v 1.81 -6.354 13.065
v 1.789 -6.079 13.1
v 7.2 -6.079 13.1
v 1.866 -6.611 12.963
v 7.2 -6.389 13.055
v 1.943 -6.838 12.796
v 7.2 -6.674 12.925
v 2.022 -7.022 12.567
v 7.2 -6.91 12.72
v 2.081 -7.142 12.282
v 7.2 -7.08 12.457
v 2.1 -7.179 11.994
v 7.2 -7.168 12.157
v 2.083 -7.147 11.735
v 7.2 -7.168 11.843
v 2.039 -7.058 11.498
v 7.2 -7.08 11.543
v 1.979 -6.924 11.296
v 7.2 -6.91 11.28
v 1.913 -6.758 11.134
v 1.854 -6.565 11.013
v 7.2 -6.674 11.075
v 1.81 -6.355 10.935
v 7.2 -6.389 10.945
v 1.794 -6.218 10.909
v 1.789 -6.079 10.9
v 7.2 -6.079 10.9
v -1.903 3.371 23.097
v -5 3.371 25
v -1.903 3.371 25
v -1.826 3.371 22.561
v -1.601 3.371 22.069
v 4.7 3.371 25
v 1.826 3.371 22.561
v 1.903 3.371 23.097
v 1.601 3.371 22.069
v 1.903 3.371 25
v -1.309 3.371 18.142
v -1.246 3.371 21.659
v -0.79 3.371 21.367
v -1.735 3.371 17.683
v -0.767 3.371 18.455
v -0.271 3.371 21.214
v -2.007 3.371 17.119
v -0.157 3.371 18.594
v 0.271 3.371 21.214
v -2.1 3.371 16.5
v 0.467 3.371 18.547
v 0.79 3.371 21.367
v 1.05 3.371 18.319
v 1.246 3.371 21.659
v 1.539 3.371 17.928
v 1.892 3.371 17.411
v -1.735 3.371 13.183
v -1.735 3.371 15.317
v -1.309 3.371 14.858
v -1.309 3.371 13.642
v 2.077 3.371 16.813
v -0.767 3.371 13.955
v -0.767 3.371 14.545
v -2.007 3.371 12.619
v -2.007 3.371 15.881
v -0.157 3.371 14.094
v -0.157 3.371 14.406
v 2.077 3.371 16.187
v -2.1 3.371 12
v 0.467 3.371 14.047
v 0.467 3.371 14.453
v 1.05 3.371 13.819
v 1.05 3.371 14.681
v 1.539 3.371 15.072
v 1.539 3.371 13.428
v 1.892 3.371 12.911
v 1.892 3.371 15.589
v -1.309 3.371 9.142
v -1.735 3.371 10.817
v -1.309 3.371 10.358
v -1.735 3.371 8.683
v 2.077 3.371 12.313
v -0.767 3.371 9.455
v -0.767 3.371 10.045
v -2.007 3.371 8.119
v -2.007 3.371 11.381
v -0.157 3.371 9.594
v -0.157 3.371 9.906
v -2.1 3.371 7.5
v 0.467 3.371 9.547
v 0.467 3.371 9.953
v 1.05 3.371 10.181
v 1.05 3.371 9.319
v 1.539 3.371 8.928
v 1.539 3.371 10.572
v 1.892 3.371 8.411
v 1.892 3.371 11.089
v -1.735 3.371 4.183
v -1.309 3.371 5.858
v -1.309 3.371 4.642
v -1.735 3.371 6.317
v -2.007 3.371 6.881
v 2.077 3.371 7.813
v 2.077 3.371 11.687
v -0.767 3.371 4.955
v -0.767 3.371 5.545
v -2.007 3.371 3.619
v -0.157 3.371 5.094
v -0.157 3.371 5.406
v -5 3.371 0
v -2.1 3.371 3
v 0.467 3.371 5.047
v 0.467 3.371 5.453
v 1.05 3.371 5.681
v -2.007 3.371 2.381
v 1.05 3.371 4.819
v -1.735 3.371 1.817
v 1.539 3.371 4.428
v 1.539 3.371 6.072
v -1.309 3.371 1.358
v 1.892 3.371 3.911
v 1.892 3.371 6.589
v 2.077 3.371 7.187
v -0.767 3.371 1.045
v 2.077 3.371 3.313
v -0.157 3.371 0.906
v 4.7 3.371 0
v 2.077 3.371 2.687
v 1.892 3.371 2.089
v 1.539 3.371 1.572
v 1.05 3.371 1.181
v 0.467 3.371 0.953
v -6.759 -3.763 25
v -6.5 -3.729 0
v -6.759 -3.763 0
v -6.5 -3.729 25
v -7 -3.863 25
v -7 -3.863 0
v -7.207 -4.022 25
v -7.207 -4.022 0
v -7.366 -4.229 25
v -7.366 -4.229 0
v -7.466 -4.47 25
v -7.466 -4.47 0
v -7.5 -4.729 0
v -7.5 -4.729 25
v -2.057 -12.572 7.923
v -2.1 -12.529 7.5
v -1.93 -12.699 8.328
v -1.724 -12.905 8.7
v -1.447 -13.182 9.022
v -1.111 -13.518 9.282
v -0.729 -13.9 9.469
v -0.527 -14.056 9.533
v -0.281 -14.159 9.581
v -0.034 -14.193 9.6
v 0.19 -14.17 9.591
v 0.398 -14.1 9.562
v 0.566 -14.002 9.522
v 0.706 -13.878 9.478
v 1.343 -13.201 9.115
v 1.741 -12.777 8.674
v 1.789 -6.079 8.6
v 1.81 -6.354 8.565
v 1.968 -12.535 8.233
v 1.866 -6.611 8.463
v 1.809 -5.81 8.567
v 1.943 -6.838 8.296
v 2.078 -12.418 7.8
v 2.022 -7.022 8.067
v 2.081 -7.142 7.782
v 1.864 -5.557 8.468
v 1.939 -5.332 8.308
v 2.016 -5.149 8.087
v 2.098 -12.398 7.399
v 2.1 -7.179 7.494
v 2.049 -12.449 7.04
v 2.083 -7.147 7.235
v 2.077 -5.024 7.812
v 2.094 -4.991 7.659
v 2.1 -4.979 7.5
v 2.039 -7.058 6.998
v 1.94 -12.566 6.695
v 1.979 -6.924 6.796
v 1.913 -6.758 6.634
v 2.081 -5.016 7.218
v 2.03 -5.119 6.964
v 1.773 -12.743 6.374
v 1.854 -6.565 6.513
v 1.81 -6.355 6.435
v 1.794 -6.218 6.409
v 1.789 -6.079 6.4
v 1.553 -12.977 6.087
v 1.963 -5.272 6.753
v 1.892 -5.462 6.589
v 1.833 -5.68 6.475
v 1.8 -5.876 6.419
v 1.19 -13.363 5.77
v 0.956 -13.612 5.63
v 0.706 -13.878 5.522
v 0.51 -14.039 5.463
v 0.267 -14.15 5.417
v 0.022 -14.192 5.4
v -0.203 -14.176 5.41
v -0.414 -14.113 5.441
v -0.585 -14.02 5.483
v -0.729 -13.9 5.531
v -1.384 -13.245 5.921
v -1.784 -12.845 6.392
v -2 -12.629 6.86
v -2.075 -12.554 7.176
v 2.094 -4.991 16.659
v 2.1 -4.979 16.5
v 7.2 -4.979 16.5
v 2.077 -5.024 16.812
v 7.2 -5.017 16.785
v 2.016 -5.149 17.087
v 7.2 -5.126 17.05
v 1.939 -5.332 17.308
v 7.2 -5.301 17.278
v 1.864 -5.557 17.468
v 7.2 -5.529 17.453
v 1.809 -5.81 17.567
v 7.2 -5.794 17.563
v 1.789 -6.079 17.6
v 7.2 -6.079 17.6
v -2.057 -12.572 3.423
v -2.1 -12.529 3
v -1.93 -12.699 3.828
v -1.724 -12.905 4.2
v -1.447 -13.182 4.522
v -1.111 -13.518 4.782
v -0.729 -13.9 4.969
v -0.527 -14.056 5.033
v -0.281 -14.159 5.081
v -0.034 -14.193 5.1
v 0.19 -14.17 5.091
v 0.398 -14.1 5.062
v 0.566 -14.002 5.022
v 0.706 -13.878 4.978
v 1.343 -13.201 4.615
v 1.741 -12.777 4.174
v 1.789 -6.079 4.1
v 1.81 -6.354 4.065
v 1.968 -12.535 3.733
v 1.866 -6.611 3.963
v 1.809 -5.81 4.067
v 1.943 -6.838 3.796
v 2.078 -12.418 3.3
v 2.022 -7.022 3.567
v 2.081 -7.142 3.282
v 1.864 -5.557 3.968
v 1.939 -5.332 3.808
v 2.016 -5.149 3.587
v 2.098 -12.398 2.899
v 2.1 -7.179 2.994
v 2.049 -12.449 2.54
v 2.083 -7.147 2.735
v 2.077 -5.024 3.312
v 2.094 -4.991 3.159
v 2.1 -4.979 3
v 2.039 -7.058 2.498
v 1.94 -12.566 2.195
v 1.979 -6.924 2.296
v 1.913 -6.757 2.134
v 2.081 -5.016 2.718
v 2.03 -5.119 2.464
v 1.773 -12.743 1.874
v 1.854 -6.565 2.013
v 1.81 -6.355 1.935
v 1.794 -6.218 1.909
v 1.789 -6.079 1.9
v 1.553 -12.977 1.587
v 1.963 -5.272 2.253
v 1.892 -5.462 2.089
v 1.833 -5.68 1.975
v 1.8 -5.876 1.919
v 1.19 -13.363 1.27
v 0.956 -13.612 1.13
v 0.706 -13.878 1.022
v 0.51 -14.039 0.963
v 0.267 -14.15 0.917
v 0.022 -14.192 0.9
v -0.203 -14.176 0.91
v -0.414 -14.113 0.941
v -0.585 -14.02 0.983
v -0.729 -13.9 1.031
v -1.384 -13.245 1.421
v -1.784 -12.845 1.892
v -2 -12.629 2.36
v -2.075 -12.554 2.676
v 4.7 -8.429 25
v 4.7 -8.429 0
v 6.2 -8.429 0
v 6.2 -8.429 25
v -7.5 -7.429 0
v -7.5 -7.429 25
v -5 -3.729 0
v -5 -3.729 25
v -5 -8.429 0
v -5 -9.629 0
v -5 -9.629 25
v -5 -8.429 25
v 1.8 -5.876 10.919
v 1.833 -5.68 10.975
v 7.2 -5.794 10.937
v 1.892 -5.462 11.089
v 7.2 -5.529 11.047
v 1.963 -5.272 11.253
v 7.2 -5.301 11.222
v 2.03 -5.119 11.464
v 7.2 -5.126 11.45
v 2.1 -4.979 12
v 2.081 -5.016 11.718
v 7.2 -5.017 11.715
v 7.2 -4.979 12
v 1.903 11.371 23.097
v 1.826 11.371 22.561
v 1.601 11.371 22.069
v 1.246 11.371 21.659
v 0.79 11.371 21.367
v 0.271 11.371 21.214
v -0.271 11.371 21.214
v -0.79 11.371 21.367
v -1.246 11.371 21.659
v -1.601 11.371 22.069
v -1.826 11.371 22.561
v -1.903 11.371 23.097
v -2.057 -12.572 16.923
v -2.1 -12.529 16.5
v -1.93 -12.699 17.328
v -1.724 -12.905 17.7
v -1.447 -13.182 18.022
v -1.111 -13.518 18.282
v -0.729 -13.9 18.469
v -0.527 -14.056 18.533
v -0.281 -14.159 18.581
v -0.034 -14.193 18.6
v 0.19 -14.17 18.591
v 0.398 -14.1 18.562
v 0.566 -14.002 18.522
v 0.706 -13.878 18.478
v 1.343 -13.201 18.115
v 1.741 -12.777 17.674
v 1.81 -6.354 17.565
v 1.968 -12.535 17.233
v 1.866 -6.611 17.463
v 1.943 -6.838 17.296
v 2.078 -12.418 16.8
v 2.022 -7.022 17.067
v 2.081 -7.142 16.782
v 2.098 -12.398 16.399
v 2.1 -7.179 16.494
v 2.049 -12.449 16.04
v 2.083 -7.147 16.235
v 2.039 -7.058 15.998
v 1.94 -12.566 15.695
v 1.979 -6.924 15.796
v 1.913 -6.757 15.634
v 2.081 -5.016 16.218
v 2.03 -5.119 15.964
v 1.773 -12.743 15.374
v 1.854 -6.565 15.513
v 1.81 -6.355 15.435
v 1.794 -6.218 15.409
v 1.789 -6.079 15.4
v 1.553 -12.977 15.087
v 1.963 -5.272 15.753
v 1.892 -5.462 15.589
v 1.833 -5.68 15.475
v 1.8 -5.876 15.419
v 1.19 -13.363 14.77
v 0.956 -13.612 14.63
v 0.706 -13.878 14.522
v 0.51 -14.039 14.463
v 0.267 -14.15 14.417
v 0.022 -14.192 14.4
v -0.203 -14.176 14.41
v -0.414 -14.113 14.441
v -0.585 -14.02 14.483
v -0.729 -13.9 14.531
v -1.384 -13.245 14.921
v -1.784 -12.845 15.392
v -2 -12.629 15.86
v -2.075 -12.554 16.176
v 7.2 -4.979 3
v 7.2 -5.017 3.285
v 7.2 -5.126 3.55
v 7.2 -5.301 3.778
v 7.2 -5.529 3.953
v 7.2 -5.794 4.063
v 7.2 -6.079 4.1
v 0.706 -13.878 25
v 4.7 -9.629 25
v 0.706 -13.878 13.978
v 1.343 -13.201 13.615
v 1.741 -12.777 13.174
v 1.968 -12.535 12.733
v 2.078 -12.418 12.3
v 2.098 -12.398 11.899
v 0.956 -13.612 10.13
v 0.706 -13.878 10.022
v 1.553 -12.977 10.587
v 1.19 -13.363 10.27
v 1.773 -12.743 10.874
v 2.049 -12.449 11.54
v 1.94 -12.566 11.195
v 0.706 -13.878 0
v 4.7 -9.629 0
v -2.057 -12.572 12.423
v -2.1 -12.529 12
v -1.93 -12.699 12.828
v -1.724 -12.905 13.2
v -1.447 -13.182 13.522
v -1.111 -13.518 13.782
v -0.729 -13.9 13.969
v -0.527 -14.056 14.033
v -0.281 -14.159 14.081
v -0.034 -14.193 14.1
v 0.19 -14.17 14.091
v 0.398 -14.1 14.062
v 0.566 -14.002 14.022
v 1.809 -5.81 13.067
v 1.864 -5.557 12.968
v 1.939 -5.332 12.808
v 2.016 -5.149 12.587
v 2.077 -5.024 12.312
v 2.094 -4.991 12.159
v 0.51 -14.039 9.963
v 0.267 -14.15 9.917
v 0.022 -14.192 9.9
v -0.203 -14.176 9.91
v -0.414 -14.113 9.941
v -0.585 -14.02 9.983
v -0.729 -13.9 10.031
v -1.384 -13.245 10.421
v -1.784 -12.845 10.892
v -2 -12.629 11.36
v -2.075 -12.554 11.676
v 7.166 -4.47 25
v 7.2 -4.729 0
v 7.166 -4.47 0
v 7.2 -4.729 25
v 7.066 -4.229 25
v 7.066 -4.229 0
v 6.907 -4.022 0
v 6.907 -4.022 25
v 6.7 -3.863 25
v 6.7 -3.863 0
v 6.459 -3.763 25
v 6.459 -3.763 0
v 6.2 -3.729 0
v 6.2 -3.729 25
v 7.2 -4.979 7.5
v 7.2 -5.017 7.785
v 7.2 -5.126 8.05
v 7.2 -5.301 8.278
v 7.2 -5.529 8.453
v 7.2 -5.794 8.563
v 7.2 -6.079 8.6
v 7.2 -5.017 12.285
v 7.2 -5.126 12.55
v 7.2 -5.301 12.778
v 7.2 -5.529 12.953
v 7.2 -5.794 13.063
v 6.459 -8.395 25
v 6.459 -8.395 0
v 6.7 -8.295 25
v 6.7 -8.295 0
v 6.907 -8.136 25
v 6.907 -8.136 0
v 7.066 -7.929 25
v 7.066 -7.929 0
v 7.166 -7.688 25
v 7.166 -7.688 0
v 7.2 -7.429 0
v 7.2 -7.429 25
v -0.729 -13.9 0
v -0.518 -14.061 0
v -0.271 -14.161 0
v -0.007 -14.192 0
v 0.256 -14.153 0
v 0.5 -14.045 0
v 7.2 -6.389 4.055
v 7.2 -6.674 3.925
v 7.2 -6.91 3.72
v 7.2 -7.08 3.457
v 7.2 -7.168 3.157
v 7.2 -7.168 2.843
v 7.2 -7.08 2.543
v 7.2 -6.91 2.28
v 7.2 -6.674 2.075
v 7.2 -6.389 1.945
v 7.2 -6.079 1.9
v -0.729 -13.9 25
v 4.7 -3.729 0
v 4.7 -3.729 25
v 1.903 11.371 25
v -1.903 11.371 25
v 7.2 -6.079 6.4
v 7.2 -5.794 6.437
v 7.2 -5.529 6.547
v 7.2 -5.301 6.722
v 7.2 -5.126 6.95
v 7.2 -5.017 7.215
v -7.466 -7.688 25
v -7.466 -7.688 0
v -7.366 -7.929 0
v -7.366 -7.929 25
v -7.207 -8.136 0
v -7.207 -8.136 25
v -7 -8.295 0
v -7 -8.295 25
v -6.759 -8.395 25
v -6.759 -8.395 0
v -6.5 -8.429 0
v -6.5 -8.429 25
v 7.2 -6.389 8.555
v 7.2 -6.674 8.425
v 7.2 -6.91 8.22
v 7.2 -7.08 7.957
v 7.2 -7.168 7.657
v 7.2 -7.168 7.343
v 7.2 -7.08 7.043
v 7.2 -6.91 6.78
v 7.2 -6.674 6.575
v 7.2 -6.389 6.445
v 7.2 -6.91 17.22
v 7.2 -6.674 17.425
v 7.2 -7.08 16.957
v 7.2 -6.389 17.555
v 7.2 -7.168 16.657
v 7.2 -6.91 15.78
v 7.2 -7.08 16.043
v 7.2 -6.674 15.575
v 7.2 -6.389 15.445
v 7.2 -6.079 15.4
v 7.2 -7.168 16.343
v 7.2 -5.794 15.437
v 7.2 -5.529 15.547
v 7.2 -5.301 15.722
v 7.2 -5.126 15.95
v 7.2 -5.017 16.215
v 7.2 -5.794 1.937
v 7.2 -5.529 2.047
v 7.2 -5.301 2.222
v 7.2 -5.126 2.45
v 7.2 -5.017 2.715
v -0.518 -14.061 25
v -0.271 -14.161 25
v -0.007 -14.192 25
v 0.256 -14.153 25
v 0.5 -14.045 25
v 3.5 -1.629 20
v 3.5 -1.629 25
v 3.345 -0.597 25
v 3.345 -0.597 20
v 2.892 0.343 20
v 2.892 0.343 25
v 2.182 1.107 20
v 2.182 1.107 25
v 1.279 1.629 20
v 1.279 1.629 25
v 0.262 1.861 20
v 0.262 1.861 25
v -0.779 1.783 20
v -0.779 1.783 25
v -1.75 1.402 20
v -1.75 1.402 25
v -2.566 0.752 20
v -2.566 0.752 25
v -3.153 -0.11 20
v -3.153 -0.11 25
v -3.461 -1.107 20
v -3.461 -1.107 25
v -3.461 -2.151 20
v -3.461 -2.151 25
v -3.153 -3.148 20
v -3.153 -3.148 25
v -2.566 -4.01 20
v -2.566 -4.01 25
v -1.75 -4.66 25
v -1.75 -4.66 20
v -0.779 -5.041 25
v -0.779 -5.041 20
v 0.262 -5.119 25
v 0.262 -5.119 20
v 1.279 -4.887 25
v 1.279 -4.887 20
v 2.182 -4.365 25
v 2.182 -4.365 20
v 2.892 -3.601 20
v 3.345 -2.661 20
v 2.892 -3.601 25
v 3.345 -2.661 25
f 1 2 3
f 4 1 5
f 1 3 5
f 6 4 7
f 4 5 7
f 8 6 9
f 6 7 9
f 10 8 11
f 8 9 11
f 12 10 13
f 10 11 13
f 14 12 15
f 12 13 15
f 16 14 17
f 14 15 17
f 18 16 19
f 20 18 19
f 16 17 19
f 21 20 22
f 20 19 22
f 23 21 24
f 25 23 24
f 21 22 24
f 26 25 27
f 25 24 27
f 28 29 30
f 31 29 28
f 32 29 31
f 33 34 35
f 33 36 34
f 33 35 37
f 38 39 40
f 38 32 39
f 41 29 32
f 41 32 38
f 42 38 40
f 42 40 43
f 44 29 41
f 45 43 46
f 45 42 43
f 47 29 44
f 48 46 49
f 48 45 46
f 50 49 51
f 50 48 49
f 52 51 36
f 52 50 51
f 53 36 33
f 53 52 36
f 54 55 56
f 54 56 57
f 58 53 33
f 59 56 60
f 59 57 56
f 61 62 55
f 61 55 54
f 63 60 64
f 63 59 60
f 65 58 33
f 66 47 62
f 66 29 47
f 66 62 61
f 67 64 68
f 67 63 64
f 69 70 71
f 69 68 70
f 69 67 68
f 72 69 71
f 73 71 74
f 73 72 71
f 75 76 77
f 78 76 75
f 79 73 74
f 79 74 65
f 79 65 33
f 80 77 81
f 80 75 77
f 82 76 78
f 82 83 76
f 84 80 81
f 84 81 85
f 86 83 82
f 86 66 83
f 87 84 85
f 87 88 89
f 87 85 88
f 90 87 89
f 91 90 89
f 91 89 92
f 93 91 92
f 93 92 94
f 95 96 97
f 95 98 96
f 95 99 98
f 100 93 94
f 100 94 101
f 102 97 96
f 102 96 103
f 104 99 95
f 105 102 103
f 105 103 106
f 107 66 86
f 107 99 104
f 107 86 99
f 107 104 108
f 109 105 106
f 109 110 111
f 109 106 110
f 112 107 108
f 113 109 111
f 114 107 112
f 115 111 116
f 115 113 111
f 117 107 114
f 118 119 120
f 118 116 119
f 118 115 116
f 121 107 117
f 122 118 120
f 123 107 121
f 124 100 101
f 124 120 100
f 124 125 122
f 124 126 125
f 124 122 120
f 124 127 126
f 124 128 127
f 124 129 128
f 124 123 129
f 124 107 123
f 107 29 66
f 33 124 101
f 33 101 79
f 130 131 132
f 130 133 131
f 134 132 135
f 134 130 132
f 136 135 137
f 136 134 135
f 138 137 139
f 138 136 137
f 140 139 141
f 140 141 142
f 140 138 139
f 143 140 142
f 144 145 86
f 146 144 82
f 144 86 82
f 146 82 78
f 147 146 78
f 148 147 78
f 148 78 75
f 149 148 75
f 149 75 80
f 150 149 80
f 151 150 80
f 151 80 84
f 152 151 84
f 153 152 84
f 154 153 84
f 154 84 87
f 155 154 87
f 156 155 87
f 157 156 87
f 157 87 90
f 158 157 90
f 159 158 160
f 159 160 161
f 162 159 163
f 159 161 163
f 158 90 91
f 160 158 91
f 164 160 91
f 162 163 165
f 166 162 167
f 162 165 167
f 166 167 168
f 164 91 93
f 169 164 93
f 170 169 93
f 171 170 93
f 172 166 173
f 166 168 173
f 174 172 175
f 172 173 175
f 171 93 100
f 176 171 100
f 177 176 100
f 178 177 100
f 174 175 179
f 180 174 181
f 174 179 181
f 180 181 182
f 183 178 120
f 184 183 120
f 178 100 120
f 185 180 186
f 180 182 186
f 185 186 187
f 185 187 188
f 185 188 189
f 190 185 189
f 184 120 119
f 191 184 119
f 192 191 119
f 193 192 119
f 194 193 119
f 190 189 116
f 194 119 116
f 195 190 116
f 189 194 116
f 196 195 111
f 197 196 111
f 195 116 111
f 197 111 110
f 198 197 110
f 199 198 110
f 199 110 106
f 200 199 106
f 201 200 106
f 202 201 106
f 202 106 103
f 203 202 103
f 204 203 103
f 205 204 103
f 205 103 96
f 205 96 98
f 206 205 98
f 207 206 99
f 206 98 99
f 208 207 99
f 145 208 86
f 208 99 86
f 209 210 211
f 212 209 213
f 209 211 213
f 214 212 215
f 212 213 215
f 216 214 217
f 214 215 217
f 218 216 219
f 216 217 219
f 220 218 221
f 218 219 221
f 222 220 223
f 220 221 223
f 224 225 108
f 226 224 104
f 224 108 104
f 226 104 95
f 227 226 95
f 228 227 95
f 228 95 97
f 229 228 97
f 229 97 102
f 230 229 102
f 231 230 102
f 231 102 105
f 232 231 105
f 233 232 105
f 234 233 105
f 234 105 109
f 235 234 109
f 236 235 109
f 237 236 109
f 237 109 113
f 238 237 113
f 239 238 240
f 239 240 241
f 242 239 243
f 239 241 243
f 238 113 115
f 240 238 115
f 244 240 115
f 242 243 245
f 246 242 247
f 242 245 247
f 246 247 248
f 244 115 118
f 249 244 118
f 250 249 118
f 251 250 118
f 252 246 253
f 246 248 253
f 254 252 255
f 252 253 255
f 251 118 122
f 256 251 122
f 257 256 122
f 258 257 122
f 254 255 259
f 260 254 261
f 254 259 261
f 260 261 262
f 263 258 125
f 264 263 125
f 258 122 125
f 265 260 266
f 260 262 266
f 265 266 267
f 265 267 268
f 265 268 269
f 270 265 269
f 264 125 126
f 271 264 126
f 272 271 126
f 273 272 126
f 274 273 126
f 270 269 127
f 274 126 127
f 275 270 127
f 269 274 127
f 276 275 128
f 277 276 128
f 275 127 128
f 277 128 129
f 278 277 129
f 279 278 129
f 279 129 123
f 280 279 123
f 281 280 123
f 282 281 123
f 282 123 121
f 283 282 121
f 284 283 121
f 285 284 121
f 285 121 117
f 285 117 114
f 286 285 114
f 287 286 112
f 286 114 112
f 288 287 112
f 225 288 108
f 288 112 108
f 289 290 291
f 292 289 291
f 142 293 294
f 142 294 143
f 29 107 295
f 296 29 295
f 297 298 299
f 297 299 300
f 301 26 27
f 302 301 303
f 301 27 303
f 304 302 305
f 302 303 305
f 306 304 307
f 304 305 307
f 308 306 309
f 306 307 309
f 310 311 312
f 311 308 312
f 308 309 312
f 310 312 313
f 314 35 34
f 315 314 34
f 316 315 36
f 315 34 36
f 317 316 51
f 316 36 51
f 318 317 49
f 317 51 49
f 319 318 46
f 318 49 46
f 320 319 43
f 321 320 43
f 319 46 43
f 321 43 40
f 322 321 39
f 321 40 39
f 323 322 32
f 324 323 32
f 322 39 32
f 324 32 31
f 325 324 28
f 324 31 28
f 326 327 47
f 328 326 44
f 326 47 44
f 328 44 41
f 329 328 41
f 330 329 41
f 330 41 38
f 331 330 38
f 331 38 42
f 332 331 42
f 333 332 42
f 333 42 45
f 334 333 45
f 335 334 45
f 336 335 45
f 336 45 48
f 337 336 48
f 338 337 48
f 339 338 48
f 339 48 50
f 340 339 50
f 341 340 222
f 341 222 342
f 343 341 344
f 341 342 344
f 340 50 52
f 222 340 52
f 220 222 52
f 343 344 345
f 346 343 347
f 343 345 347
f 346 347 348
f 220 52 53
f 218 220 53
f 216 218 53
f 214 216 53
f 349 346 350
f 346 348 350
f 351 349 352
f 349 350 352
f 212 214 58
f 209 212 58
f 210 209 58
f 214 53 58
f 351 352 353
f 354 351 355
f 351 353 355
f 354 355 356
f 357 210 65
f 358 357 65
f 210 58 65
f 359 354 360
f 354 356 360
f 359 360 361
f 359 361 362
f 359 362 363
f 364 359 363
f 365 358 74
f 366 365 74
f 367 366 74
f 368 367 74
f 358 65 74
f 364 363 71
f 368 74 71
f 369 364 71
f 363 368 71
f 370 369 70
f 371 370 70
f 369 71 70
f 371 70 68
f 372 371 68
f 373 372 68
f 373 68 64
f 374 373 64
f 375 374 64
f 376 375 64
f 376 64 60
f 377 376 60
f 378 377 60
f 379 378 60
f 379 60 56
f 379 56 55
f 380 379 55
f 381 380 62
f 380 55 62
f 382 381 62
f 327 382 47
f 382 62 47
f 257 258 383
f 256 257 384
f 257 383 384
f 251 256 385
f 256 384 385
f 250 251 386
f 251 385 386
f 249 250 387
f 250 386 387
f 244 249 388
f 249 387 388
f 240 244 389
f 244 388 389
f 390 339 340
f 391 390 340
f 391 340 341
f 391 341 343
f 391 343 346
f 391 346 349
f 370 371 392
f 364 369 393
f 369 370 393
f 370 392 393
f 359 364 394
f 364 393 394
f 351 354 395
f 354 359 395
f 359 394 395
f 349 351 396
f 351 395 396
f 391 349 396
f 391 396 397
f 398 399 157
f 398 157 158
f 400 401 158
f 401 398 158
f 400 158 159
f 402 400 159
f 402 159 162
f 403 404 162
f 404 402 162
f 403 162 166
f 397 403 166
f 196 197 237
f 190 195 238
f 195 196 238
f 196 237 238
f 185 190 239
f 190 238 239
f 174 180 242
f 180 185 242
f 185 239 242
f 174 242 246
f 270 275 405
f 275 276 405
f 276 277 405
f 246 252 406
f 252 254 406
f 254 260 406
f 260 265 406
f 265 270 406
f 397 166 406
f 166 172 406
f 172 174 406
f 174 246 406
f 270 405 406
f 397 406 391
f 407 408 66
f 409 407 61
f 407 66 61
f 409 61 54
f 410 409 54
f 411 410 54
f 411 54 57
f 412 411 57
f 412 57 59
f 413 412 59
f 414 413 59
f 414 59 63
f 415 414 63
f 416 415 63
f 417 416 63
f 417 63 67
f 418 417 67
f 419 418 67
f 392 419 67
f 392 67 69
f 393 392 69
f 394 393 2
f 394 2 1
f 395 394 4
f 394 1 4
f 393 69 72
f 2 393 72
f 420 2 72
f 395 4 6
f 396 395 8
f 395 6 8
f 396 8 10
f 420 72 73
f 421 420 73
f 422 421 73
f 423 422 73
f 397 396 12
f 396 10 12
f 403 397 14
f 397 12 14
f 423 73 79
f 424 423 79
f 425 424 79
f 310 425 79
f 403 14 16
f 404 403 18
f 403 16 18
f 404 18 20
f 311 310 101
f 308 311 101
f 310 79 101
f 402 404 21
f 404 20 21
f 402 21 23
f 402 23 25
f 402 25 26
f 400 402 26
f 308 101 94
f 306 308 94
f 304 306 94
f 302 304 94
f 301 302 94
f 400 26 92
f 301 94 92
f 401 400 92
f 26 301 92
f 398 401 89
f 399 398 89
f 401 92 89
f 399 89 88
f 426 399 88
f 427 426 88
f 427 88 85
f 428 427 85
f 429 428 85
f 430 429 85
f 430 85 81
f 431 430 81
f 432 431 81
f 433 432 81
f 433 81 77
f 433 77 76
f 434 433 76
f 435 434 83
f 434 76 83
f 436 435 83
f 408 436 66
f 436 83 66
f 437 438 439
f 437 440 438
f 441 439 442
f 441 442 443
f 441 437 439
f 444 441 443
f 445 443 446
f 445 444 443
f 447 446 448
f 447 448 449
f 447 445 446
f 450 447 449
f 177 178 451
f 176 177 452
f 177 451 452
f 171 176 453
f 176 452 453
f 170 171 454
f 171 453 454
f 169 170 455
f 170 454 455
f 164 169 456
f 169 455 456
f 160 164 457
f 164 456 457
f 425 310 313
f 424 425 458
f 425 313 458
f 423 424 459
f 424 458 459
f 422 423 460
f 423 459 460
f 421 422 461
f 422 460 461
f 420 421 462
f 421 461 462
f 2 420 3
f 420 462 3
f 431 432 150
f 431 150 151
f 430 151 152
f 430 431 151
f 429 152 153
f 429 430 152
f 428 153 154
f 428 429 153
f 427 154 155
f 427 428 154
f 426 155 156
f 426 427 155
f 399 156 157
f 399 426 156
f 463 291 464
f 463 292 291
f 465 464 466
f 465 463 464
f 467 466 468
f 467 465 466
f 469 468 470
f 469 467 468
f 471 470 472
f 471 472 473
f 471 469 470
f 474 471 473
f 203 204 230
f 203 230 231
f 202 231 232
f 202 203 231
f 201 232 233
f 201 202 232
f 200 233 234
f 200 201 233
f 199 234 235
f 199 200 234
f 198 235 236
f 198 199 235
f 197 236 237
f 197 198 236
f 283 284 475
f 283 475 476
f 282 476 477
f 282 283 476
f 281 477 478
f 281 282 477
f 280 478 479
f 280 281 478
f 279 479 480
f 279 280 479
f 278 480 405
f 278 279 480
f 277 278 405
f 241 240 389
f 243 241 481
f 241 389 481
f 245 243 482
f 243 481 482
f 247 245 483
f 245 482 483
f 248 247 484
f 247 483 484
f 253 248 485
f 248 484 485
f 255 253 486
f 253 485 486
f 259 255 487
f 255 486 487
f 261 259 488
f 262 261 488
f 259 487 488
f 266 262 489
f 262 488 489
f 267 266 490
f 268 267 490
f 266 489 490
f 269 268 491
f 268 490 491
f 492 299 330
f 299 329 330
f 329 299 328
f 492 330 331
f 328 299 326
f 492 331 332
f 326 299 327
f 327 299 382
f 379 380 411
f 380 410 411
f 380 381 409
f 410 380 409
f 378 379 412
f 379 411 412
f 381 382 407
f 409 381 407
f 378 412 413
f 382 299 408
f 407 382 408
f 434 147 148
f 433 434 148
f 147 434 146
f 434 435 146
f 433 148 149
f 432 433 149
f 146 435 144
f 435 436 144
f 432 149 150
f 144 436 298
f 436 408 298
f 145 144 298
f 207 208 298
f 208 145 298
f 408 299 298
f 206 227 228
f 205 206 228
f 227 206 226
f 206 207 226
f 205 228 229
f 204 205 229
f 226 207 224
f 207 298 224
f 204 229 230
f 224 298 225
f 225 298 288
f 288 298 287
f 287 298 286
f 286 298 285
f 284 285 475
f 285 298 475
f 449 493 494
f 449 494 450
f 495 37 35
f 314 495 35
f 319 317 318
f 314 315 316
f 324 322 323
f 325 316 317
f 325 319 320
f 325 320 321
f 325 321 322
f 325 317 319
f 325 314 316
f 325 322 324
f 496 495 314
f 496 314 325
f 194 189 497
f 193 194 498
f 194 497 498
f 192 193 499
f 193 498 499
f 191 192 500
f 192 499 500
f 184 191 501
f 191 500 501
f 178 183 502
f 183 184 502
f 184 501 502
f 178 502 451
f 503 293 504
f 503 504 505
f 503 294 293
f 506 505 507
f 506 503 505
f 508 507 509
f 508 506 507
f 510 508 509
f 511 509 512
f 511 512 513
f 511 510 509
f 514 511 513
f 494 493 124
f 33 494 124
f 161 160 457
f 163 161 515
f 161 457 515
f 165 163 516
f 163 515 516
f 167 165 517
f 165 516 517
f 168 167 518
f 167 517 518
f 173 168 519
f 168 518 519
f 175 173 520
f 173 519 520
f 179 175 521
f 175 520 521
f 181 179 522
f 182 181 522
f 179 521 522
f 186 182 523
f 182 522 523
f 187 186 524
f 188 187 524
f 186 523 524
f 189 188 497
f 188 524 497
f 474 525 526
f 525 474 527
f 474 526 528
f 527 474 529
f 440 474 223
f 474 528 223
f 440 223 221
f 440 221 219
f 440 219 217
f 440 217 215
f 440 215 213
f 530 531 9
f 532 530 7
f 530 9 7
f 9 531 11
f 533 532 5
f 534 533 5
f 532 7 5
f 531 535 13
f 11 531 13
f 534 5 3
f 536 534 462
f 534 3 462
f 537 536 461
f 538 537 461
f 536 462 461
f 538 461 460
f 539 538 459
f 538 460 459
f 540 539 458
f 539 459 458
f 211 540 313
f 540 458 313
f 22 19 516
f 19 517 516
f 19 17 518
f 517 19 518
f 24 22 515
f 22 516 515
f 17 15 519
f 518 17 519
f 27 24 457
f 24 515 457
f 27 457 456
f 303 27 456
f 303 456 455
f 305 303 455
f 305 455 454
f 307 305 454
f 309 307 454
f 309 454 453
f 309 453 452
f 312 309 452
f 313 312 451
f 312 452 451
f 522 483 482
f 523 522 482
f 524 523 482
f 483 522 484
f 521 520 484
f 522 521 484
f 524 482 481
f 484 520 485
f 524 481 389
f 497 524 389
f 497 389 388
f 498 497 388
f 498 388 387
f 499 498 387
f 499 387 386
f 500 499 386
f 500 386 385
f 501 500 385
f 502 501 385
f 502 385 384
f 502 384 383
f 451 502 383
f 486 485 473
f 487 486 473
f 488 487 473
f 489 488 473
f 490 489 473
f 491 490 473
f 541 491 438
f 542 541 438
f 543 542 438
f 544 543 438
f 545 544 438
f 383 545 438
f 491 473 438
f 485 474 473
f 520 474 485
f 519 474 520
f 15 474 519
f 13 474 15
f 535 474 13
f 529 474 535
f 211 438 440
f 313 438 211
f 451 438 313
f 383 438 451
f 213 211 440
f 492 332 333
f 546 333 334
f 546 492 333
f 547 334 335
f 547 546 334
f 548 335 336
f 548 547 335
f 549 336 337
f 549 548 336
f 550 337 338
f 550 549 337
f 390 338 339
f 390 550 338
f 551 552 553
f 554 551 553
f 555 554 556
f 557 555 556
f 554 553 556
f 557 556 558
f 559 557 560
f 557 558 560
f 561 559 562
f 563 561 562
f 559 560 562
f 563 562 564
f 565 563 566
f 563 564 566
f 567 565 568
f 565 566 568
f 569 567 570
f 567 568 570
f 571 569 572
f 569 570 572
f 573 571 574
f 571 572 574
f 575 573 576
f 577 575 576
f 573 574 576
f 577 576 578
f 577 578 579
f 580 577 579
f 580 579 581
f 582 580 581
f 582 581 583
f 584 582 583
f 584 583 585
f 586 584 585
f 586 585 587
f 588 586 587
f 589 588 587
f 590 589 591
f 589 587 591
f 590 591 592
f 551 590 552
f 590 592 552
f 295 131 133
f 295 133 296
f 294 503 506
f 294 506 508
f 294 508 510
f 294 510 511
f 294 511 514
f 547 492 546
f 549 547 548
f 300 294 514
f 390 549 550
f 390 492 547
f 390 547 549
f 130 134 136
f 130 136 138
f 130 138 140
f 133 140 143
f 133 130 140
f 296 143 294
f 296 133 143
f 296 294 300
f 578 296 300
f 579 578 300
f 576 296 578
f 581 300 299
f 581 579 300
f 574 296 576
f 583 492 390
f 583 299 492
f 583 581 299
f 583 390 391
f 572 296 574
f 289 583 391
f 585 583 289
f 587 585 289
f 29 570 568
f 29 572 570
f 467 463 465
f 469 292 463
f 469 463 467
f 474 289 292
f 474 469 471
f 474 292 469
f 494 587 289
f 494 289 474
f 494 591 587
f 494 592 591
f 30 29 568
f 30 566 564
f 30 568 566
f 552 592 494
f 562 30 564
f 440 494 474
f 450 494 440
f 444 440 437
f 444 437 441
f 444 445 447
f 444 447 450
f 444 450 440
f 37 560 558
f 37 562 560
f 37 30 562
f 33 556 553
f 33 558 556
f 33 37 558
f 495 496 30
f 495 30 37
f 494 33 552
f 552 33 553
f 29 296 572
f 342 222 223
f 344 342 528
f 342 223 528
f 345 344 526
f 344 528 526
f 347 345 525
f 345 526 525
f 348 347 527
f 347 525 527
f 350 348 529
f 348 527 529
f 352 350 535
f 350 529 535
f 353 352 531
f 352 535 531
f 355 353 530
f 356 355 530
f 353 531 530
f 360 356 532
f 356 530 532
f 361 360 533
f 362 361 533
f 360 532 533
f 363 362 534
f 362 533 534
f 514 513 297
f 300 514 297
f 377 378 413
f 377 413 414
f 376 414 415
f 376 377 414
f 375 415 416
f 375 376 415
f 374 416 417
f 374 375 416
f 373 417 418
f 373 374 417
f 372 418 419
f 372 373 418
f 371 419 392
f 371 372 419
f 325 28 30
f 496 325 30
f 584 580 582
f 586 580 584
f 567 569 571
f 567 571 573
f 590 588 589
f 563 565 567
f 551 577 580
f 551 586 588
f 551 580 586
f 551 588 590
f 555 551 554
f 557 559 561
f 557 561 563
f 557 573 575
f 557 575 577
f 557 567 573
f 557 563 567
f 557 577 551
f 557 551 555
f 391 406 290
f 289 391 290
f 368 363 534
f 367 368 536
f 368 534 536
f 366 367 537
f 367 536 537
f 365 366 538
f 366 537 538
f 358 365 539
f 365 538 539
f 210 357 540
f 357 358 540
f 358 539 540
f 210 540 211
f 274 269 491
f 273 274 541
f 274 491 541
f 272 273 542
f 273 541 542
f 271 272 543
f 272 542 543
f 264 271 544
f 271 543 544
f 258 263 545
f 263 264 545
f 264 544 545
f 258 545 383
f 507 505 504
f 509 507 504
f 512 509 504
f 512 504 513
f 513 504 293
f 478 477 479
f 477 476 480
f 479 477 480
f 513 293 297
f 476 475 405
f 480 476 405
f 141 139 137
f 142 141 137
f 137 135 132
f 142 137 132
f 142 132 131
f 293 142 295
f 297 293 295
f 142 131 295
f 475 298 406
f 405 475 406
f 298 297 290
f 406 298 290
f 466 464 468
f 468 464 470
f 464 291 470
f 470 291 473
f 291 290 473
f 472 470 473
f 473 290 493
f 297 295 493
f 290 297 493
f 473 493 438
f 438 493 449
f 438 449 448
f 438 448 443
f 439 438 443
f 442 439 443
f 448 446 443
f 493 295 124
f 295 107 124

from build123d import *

# Parameters (mm, degrees)
F0_W      = 9.7
F0_H      = 7.1
F0_H_2    = 4.7
F0_W_2    = 2.5
F0_H_3    = 1.2
F1_DEPTH  = 25
F2_R      = 1
F3_R      = 2.1
F4_DEPTH  = 30
F6_DEPTH  = 8
F7_R      = 3.5
F8_DEPTH  = 5
F10_DEPTH = 6


with BuildPart() as f1:
    # F0 (on Top) → F1 (new body)
    with BuildSketch(Plane.XY):
        with Locations((-0.15, -0.179021287)):
            Rectangle(F0_W, F0_H)
        with Locations((-0.15, -6.079021287)):
            Rectangle(F0_W, F0_H_2)
        with Locations((-6.25, -6.079021287)):
            Rectangle(F0_W_2, F0_H_2)
        with Locations((5.95, -6.079021287)):
            Rectangle(F0_W_2, F0_H_2)
        with Locations((-0.15, -9.029021287)):
            Rectangle(F0_W, F0_H_3)
        Polygon((4.7, -9.629021287), (-5, -9.629021287), (0, -14.629021287), align=None)
    extrude(amount=F1_DEPTH)

    # F2
    f2_edges = [f1.edges().sort_by_distance(p)[0] for p in [
        (-7.5, -3.729021, 12.5),
        (-7.5, -8.429021, 12.5),
        (7.2, -3.729021, 12.5),
        (7.2, -8.429021, 12.5),
        (0, -14.629021, 12.5),
    ]]
    fillet(f2_edges, radius=F2_R)

    # F3 (on face) → F4 (cut)
    with BuildSketch(Plane(origin=(0, 3.370978713, 0), x_dir=(-1, 0, 0), z_dir=(0, 1, 0))):
        with Locations((0, 7.5)):
            Circle(F3_R)
        with Locations((0, 12)):
            Circle(F3_R)
        with Locations((0, 3)):
            Circle(F3_R)
        with Locations((0, 16.5)):
            Circle(F3_R)
    extrude(amount=-F4_DEPTH, mode=Mode.SUBTRACT)

    # F5 (on face) → F6 (join)
    with BuildSketch(Plane(origin=(0, 3.370978713, 0), x_dir=(-1, 0, 0), z_dir=(0, 1, 0))):
        with BuildLine():
            ThreePointArc((0, 25), (-1.3453995809, 24.4427172468), (-1.9026823342, 23.0973176658))
            ThreePointArc((-1.9026823342, 23.0973176658), (0, 21.1946353316), (1.9026823342, 23.0973176658))
            ThreePointArc((1.9026823342, 23.0973176658), (1.3453995809, 24.4427172468), (0, 25))
        make_face()
        with BuildLine():
            Line((-1.9026823342, 25), (-1.9026823342, 23.0973176658))
            ThreePointArc((-1.9026823342, 23.0973176658), (-1.3453995809, 24.4427172468), (0, 25))
            Line((0, 25), (-1.9026823342, 25))
        make_face()
        with BuildLine():
            ThreePointArc((0, 25), (1.3453995809, 24.4427172468), (1.9026823342, 23.0973176658))
            Line((1.9026823342, 23.0973176658), (1.9026823342, 25))
            Line((1.9026823342, 25), (0, 25))
        make_face()
    extrude(amount=F6_DEPTH)

    # F7 (on face) → F8 (cut)
    with BuildSketch(Plane.XY.offset(25)):
        with Locations((0, -1.629021287)):
            Circle(F7_R)
    extrude(amount=-F8_DEPTH, mode=Mode.SUBTRACT)

    # F9 (on face) → F10 (cut)
    with BuildSketch(Plane.YZ.offset(7.2)):
        with BuildLine():
            ThreePointArc((-6.079021287, 15.4), (-5.3012038277, 15.7221825407), (-4.979021287, 16.5))
            ThreePointArc((-4.979021287, 16.5), (-5.3012038277, 17.2778174593), (-6.079021287, 17.6))
            Line((-6.079021287, 17.6), (-6.079021287, 15.4))
        make_face()
        with BuildLine():
            ThreePointArc((-4.979021287, 3), (-5.3012038277, 3.7778174593), (-6.079021287, 4.1))
            Line((-6.079021287, 4.1), (-6.079021287, 1.9))
            ThreePointArc((-6.079021287, 1.9), (-5.3012038277, 2.2221825407), (-4.979021287, 3))
        make_face()
        with BuildLine():
            Line((-6.079021287, 1.9), (-6.079021287, 4.1))
            ThreePointArc((-6.079021287, 4.1), (-7.179021287, 3), (-6.079021287, 1.9))
        make_face()
        with BuildLine():
            ThreePointArc((-4.979021287, 7.5), (-5.3012038277, 8.2778174593), (-6.079021287, 8.6))
            Line((-6.079021287, 8.6), (-6.079021287, 6.4))
            ThreePointArc((-6.079021287, 6.4), (-5.3012038277, 6.7221825407), (-4.979021287, 7.5))
        make_face()
        with BuildLine():
            Line((-6.079021287, 6.4), (-6.079021287, 8.6))
            ThreePointArc((-6.079021287, 8.6), (-7.179021287, 7.5), (-6.079021287, 6.4))
        make_face()
        with BuildLine():
            ThreePointArc((-4.979021287, 12), (-5.3012038277, 12.7778174593), (-6.079021287, 13.1))
            Line((-6.079021287, 13.1), (-6.079021287, 10.9))
            ThreePointArc((-6.079021287, 10.9), (-5.3012038277, 11.2221825407), (-4.979021287, 12))
        make_face()
        with BuildLine():
            Line((-6.079021287, 10.9), (-6.079021287, 13.1))
            ThreePointArc((-6.079021287, 13.1), (-7.179021287, 12), (-6.079021287, 10.9))
        make_face()
        with BuildLine():
            Line((-6.079021287, 15.4), (-6.079021287, 17.6))
            ThreePointArc((-6.079021287, 17.6), (-7.179021287, 16.5), (-6.079021287, 15.4))
        make_face()
    extrude(amount=-F10_DEPTH, mode=Mode.SUBTRACT)


solid = f1.part
